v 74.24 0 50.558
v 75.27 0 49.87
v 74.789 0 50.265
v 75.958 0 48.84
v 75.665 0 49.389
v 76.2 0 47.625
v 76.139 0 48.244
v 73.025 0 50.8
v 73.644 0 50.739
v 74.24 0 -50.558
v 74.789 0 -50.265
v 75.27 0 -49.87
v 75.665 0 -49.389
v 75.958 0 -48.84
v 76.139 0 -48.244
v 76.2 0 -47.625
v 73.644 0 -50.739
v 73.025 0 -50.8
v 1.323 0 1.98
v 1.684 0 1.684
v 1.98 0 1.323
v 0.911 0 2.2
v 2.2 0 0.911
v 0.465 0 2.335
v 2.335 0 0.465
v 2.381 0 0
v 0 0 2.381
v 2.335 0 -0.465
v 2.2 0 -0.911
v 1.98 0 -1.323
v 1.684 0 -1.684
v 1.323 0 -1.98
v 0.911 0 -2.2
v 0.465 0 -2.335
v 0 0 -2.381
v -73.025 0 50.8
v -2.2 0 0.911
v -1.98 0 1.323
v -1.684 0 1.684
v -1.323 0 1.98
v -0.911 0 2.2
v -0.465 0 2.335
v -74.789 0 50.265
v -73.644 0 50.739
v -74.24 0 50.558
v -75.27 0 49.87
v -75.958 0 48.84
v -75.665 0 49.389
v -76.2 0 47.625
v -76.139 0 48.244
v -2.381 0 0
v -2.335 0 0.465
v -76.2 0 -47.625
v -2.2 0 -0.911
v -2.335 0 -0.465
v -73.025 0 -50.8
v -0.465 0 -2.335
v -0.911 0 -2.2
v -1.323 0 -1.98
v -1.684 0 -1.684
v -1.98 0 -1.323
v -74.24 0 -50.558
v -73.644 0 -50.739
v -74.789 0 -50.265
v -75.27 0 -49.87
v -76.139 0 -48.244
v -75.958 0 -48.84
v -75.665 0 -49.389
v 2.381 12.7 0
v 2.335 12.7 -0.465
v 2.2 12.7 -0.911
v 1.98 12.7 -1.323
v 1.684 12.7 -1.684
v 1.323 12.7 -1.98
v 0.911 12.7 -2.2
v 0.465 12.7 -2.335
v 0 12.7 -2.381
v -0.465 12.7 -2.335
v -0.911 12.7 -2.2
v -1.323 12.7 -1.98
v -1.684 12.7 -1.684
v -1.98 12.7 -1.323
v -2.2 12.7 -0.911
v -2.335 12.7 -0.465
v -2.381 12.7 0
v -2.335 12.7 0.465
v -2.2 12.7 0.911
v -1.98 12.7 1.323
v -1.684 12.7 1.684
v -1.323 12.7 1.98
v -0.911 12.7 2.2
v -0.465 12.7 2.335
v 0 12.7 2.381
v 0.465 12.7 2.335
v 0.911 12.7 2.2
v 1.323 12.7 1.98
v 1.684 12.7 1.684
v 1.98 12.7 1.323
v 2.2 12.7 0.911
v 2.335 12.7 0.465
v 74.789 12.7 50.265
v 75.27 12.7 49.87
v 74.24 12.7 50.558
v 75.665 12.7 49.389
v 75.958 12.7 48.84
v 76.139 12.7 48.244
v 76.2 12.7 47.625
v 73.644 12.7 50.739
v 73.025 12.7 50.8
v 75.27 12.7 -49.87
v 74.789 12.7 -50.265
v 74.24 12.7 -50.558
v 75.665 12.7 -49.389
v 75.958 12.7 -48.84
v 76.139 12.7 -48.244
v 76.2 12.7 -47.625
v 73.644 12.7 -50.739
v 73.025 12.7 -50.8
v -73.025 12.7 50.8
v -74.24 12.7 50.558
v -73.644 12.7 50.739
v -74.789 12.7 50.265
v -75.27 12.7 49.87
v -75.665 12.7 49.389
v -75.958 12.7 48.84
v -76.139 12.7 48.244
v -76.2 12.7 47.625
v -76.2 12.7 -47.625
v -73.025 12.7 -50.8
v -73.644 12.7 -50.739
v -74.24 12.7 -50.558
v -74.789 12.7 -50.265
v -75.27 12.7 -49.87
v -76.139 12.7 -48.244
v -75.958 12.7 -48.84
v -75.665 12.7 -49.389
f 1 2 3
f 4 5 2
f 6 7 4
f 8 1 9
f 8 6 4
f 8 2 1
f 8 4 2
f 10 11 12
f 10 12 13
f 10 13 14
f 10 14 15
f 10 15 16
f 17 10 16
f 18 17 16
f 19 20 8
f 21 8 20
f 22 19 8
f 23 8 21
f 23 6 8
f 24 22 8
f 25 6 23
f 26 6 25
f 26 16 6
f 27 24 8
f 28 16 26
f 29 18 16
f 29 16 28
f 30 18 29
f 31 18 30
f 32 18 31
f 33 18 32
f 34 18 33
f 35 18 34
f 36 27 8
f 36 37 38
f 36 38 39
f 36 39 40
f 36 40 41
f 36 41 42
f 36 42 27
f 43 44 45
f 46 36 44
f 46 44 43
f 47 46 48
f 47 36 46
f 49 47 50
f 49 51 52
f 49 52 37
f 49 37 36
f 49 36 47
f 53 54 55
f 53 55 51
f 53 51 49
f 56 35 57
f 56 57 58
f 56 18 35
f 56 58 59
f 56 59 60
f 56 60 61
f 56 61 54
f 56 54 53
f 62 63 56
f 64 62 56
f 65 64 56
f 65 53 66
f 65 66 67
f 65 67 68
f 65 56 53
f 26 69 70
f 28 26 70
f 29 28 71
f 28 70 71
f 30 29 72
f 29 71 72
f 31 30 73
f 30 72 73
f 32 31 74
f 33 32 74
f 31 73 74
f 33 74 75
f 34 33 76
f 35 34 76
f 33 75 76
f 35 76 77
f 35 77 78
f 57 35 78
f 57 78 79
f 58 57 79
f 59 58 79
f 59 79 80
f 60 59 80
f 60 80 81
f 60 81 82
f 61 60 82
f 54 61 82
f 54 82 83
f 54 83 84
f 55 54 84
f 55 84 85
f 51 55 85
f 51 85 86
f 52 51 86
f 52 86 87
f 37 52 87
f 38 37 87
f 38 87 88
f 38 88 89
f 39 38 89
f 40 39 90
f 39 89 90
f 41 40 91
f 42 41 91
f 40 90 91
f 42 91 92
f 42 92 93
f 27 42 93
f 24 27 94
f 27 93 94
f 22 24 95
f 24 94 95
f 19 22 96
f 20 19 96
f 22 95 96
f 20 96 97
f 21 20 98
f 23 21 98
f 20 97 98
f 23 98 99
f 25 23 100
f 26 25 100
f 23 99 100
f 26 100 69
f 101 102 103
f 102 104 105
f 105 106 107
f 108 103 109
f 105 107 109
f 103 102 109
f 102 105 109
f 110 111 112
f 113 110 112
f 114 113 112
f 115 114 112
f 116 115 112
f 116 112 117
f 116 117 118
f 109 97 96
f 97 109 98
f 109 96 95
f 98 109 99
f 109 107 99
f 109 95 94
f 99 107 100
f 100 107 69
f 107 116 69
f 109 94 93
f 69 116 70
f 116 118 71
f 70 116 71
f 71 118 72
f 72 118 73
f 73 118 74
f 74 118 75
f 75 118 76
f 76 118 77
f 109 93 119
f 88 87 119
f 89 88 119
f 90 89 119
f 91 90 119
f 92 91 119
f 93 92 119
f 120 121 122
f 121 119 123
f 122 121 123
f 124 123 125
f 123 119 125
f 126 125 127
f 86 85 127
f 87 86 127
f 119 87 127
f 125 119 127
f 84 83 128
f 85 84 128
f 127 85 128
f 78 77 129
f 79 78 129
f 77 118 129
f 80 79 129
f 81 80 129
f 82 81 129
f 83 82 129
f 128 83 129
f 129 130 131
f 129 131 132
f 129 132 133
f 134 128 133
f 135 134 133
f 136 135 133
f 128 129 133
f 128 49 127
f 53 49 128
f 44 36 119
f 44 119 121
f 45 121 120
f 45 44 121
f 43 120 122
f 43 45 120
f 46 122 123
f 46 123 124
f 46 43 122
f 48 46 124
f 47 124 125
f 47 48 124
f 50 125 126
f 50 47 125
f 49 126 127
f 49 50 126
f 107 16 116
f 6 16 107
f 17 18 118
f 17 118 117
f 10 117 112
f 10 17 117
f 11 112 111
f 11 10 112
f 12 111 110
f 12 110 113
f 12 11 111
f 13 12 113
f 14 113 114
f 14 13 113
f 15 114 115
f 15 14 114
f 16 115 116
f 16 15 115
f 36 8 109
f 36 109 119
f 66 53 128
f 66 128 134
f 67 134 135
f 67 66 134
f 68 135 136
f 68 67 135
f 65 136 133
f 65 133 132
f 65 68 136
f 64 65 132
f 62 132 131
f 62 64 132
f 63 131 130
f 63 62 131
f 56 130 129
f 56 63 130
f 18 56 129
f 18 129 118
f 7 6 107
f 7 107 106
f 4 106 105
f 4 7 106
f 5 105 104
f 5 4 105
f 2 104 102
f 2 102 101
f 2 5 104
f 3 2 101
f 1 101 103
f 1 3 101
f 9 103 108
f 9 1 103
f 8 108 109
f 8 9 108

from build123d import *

# Parameters (mm, degrees)
BOSS_EXTRUDE1_DEPTH = 12.7
CUT_EXTRUDE1_START  = 12.7
SKETCH2_R           = 2.38125
CUT_EXTRUDE1_DEPTH  = 13.7


with BuildPart() as part:
    # Sketch1 → Boss-Extrude1 (new body)
    with BuildSketch(Plane(origin=(0, 0, 0), x_dir=(1, 0, 0), z_dir=(0, 1, 0))):
        with BuildLine():
            Line((-73.025, 50.8), (73.025, 50.8))
            ThreePointArc((73.025, 50.8), (75.27006403, 49.87006403), (76.2, 47.625))
            Line((76.2, 47.625), (76.2, -47.625))
            ThreePointArc((76.2, -47.625), (75.27006403, -49.87006403), (73.025, -50.8))
            Line((73.025, -50.8), (-73.025, -50.8))
            ThreePointArc((-73.025, -50.8), (-75.27006403, -49.87006403), (-76.2, -47.625))
            Line((-76.2, -47.625), (-76.2, 47.625))
            ThreePointArc((-76.2, 47.625), (-75.27006403, 49.87006403), (-73.025, 50.8))
        make_face()
    extrude(amount=BOSS_EXTRUDE1_DEPTH)

    # Sketch2 → Cut-Extrude1 (cut, through all)
    with BuildSketch(Plane(origin=(0, 0, 0), x_dir=(1, 0, 0), z_dir=(0, 1, 0)).offset(CUT_EXTRUDE1_START)):
        Circle(SKETCH2_R)
    extrude(amount=-CUT_EXTRUDE1_DEPTH, mode=Mode.SUBTRACT)


solid = part.part
